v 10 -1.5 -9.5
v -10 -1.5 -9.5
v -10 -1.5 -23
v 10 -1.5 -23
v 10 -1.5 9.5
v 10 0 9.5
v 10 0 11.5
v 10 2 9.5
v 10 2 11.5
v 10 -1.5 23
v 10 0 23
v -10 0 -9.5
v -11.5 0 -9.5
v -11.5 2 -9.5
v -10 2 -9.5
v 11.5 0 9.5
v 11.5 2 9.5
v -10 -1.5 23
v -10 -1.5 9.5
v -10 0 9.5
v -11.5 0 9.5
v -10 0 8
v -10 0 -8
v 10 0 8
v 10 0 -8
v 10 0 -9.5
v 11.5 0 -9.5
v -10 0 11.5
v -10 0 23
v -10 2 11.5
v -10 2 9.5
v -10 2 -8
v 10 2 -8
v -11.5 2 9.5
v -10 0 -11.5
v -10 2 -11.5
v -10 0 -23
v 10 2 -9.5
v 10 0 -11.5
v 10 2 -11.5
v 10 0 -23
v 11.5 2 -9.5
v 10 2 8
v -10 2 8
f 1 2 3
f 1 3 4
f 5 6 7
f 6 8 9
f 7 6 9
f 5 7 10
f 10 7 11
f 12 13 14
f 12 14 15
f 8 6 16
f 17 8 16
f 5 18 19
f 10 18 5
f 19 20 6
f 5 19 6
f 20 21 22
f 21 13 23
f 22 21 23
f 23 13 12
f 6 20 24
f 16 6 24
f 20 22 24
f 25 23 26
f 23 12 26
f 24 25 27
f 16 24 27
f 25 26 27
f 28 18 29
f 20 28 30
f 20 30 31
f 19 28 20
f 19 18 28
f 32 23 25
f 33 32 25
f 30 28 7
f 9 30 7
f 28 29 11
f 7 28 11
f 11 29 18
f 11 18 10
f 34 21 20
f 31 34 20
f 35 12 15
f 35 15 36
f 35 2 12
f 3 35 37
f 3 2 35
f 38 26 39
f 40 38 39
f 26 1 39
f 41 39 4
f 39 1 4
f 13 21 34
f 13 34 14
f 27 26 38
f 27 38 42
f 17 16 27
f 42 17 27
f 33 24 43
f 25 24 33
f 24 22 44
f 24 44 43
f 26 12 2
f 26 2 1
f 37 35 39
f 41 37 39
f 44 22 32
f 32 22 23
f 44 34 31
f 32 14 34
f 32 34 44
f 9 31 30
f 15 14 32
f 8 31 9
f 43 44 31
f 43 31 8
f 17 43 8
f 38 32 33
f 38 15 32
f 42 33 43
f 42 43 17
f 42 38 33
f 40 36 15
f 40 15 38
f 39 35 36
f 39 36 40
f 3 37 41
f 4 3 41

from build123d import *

# Parameters (mm, degrees)
SKETCH1_W             = 23
SKETCH1_H             = 19
SKETCH1_W_2           = 20
SKETCH1_H_2           = 16
BOSS_EXTRUDE1_DEPTH   = 2
SKETCH2_W             = 20
SKETCH2_H             = 13.5
BOSS_EXTRUDE3_DEPTH   = 1.5
BOSS_EXTRUDE3_2_DEPTH = 1.5
SKETCH3_W             = 20
SKETCH3_H             = 2
BOSS_EXTRUDE4_DEPTH   = 2


with BuildPart() as part:
    # Sketch1 → Boss-Extrude1 (new body)
    with BuildSketch(Plane(origin=(0, 0, 0), x_dir=(1, 0, 0), z_dir=(0, 1, 0))):
        Rectangle(SKETCH1_W, SKETCH1_H)
        Rectangle(SKETCH1_W_2, SKETCH1_H_2, mode=Mode.SUBTRACT)
    extrude(amount=BOSS_EXTRUDE1_DEPTH)



with BuildPart() as body_2:
    # Sketch2 → Boss-Extrude3 (new body)
    with BuildSketch(Plane.XZ):
        with Locations((0, 16.25)):
            Rectangle(SKETCH2_W, SKETCH2_H)
    extrude(amount=BOSS_EXTRUDE3_DEPTH)


with BuildPart() as body_3:
    # Sketch2 → Boss-Extrude3 2 (new body)
    with BuildSketch(Plane.XZ):
        with Locations((0, -16.25)):
            Rectangle(SKETCH2_W, SKETCH2_H)
    extrude(amount=BOSS_EXTRUDE3_2_DEPTH)


with BuildPart() as part_1:
    add(part.part)

    add(body_2.part)  # Boss-Extrude4 merges body 2

    add(body_3.part)  # Boss-Extrude4 merges body 3
    # Sketch3 → Boss-Extrude4 (add)
    with BuildSketch(Plane(origin=(0, 0, 0), x_dir=(1, 0, 0), z_dir=(0, 1, 0))):
        with Locations((0, 10.5)):
            Rectangle(SKETCH3_W, SKETCH3_H)
        with Locations((0, -10.5)):
            Rectangle(SKETCH3_W, SKETCH3_H)
    extrude(amount=BOSS_EXTRUDE4_DEPTH)


solid = part_1.part
